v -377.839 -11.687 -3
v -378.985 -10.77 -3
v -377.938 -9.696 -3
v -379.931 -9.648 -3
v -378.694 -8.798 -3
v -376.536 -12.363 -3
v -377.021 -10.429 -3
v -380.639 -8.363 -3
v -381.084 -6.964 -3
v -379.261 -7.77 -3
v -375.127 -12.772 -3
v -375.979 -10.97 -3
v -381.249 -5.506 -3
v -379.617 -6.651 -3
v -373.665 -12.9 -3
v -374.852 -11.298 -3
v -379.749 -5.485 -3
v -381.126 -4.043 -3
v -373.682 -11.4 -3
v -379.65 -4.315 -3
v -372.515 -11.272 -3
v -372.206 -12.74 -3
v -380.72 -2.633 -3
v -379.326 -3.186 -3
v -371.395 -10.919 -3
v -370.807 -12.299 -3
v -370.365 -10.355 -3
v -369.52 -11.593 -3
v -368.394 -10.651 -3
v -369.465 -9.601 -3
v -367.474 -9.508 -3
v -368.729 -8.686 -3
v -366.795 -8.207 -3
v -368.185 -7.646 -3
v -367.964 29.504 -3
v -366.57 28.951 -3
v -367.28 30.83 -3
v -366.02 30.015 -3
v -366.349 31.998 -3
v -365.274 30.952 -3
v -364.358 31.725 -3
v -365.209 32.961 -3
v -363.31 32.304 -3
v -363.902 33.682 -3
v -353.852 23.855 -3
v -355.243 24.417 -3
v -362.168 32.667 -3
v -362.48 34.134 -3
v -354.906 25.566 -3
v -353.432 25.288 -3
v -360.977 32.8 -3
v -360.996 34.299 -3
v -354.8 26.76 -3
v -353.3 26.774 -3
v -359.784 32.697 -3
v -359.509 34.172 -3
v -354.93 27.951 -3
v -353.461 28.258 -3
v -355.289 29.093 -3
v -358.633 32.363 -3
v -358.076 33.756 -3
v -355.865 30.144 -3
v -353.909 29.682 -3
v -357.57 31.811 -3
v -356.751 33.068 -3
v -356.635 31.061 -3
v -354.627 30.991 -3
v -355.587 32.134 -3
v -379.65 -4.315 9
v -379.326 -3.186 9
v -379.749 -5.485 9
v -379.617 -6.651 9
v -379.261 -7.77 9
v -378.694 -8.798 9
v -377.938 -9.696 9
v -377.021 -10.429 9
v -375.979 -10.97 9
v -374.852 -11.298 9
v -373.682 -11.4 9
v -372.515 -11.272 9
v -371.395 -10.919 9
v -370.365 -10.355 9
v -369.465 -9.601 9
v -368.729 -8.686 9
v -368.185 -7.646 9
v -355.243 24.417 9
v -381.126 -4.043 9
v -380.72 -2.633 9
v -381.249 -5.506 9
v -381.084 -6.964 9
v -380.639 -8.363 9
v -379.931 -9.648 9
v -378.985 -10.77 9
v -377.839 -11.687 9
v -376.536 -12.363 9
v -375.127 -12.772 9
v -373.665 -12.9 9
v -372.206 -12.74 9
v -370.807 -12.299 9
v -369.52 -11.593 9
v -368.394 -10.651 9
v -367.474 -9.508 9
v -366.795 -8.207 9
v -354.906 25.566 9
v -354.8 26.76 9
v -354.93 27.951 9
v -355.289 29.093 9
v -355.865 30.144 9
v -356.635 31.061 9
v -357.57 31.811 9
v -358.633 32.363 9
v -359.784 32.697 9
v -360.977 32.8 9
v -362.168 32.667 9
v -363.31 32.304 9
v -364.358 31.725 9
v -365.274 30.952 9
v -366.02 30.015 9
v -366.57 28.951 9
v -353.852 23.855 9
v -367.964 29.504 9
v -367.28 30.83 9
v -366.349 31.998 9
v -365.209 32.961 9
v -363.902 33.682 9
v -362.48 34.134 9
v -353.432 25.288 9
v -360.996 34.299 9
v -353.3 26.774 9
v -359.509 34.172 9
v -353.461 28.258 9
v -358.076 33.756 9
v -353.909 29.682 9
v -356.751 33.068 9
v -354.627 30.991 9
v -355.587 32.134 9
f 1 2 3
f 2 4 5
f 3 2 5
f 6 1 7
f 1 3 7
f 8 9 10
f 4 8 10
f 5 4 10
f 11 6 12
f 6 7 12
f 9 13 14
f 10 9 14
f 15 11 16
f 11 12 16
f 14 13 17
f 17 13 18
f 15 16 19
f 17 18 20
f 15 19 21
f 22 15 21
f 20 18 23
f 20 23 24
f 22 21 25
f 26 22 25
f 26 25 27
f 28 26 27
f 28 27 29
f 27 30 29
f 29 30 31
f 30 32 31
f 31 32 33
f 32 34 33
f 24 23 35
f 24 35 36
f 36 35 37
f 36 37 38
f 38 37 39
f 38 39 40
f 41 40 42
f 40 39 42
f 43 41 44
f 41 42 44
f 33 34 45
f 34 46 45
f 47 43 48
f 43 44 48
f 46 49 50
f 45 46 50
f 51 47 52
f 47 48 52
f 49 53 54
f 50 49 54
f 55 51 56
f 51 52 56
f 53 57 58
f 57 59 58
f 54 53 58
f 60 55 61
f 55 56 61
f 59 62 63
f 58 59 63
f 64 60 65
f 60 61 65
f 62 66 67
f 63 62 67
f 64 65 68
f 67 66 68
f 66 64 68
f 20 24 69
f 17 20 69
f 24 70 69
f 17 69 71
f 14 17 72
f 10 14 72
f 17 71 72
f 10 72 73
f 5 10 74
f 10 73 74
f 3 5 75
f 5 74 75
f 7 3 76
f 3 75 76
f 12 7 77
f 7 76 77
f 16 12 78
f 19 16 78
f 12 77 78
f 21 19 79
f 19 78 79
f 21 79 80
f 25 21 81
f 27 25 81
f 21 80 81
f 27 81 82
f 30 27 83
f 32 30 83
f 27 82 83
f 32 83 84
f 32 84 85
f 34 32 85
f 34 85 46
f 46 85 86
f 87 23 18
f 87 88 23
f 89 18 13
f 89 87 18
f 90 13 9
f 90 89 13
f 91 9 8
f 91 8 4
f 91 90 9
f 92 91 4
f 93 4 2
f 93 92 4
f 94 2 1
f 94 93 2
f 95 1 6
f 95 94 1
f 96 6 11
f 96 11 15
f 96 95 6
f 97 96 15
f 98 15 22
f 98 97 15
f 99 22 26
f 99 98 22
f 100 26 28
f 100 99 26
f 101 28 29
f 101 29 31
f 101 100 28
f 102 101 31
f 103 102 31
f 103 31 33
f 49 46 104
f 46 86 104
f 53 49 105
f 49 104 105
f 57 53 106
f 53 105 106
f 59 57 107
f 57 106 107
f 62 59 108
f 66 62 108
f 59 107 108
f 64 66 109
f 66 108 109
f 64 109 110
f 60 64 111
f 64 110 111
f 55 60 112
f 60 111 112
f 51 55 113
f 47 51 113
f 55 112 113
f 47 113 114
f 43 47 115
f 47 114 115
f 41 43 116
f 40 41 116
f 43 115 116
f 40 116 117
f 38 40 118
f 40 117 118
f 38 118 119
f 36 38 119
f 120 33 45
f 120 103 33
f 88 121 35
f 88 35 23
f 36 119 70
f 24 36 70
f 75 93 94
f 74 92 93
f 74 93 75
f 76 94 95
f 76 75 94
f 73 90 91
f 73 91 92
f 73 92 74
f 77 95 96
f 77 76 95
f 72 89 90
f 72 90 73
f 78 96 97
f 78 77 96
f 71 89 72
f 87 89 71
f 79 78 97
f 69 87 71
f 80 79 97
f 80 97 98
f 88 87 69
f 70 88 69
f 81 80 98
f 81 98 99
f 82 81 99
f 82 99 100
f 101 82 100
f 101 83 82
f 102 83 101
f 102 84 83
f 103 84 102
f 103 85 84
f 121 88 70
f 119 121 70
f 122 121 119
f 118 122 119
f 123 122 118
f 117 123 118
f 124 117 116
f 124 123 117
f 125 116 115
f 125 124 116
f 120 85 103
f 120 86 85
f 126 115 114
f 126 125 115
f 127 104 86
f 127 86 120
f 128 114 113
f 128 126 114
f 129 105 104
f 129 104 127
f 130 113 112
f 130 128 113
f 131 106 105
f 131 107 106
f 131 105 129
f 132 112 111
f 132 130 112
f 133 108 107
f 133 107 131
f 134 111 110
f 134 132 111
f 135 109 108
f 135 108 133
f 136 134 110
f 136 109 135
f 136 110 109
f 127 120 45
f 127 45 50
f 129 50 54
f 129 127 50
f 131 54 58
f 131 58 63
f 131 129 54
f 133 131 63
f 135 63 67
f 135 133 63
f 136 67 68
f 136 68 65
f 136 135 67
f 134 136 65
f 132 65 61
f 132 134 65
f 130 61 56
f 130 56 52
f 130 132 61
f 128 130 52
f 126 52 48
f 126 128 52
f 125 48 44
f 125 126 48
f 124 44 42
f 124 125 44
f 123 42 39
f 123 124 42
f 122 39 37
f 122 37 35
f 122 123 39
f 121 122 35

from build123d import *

# Parameters (mm, degrees)
SALIENTE_EXTRUIR1_DEPTH = 6


with BuildPart() as part:
    # Croquis3 → Saliente-Extruir1 (new body, symmetric)
    with BuildSketch(Plane.XY.offset(3)):
        with BuildLine():
            Line((-366.794500886, -8.207293434), (-353.852479494, 23.855275987))
            ThreePointArc((-353.852479494, 23.855275987), (-358.075670455, 33.755718434), (-367.963857344, 29.503911452))
            Line((-367.963857344, 29.503911452), (-380.720202712, -2.63298212))
            ThreePointArc((-380.720202712, -2.63298212), (-376.536458173, -12.362880034), (-366.794500886, -8.207293434))
        make_face()
        with BuildLine():
            Line((-366.569674973, 28.950507876), (-379.326020341, -3.186385696))
            ThreePointArc((-379.326020341, -3.186385696), (-375.979024711, -10.970304027), (-368.185458881, -7.645834747))
            Line((-368.185458881, -7.645834747), (-355.243437488, 24.416734674))
            ThreePointArc((-355.243437488, 24.416734674), (-358.633103918, 32.363142427), (-366.569674973, 28.950507876))
        make_face(mode=Mode.SUBTRACT)
    extrude(amount=SALIENTE_EXTRUIR1_DEPTH, both=True)


solid = part.part
